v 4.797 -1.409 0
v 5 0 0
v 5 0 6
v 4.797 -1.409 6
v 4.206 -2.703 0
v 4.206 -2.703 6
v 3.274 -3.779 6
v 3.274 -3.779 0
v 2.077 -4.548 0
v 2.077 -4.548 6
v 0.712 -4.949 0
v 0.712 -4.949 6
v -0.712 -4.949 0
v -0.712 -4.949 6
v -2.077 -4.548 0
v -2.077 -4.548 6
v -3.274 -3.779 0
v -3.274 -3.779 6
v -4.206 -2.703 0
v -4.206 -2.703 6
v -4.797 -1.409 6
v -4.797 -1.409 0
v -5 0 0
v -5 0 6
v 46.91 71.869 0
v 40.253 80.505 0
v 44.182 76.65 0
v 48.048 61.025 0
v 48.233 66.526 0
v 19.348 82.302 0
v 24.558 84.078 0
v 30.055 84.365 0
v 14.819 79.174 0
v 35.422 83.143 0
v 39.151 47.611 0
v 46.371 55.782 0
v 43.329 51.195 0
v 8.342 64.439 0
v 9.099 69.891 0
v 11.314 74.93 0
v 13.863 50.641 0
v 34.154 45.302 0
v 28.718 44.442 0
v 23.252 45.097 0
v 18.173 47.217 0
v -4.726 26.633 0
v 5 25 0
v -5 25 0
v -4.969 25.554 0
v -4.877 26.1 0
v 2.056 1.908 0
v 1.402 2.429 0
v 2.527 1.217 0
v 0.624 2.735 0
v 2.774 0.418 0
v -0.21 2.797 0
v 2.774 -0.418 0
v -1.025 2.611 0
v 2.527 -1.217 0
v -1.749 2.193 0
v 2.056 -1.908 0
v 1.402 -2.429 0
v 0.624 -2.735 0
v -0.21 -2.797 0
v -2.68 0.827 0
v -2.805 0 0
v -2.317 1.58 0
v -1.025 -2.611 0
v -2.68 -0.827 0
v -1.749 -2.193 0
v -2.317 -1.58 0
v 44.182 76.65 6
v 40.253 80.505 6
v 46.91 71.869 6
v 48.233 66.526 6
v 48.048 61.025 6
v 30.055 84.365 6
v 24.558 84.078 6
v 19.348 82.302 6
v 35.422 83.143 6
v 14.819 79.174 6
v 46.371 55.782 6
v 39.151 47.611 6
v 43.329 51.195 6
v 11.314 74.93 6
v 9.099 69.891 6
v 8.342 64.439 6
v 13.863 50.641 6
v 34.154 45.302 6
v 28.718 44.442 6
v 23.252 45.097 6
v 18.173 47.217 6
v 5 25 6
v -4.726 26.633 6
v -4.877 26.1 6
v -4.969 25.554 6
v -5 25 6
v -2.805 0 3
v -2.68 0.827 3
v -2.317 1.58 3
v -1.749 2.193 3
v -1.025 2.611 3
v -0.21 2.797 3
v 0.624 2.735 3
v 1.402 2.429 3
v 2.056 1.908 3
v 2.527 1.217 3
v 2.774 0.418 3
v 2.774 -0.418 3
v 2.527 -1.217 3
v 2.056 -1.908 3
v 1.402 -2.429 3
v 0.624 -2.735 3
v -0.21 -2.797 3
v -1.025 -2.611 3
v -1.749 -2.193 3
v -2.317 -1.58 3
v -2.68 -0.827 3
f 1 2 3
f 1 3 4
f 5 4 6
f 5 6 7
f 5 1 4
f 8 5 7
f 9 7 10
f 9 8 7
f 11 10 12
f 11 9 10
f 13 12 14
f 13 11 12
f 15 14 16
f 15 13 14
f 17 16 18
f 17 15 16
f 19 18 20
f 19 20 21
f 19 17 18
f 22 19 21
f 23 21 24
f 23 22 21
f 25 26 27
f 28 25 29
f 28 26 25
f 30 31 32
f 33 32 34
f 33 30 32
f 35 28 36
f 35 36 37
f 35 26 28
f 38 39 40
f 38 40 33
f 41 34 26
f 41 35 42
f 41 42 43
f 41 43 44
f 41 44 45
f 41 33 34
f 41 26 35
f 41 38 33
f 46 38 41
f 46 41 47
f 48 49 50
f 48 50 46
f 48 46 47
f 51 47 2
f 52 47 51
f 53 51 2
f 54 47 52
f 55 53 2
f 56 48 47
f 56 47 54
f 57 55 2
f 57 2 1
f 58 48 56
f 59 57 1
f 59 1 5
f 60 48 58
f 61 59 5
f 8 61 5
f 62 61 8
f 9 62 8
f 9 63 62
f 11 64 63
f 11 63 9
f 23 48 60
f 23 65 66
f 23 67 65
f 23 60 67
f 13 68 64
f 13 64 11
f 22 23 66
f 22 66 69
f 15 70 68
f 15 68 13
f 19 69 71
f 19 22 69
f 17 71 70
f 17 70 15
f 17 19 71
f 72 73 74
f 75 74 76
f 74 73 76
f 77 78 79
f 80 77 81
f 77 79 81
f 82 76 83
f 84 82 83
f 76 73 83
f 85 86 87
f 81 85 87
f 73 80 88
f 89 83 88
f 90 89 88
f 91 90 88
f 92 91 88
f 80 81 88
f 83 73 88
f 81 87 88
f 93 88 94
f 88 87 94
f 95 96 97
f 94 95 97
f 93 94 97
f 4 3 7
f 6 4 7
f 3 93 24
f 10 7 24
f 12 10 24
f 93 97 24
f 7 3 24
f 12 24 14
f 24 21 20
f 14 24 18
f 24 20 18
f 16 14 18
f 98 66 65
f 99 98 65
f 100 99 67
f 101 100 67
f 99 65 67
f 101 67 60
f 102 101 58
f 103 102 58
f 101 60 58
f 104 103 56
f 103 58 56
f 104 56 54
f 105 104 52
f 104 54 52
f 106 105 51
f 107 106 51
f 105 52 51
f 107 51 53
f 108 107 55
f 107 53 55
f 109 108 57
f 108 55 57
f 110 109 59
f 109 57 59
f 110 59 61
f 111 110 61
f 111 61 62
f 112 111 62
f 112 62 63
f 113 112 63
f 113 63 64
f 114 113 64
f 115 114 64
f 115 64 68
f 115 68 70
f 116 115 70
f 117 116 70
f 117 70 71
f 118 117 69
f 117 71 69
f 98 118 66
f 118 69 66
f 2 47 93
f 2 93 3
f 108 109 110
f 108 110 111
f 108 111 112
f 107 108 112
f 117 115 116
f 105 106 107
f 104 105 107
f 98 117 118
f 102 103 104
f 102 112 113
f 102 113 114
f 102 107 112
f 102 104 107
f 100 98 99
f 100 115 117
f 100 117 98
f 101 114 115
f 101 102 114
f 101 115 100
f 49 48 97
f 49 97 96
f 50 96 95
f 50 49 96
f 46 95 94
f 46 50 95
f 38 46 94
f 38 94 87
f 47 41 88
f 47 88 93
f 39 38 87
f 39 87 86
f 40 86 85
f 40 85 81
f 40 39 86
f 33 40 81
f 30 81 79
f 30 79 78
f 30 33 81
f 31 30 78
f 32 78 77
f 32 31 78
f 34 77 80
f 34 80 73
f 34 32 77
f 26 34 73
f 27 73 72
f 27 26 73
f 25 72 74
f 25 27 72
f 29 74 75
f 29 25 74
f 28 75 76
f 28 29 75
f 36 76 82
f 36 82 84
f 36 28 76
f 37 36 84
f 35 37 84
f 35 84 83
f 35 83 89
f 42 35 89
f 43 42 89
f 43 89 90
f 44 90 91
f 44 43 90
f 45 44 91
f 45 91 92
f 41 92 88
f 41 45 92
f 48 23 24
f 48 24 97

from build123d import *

# Parameters (mm, degrees)
BOSS_EXTRUDE1_DEPTH = 6
SKETCH2_R           = 2.804848486
CUT_EXTRUDE1_DEPTH  = 3


with BuildPart() as part:
    # Sketch1 → Boss-Extrude1 (new body)
    with BuildSketch(Plane(origin=(0, 0, 0), x_dir=(0, 1, 0), z_dir=(0, 0, 1))):
        with BuildLine():
            Line((0, 5), (25, 5))
            ThreePointArc((25, 5), (25.828163089, 4.930937629), (26.633448216, 4.725658359))
            Line((26.633448216, 4.725658359), (64.438715088, -8.341927368))
            ThreePointArc((64.438715088, -8.341927368), (71.86918023, -46.91040032), (50.641475986, -13.863108592))
            Line((50.641475986, -13.863108592), (25, -5))
            Line((25, -5), (0, -5))
            ThreePointArc((0, -5), (-5, 0), (0, 5))
        make_face()
    extrude(amount=BOSS_EXTRUDE1_DEPTH)

    # Sketch2 → Cut-Extrude1 (cut)
    with BuildSketch(Plane(origin=(0, 0, 0), x_dir=(1, 0, 0), z_dir=(0, 0, -1))):
        with Locations(Location((0, 0, 0), (0, 0, 180))):
            Circle(SKETCH2_R)
    extrude(amount=-CUT_EXTRUDE1_DEPTH, mode=Mode.SUBTRACT)


solid = part.part
